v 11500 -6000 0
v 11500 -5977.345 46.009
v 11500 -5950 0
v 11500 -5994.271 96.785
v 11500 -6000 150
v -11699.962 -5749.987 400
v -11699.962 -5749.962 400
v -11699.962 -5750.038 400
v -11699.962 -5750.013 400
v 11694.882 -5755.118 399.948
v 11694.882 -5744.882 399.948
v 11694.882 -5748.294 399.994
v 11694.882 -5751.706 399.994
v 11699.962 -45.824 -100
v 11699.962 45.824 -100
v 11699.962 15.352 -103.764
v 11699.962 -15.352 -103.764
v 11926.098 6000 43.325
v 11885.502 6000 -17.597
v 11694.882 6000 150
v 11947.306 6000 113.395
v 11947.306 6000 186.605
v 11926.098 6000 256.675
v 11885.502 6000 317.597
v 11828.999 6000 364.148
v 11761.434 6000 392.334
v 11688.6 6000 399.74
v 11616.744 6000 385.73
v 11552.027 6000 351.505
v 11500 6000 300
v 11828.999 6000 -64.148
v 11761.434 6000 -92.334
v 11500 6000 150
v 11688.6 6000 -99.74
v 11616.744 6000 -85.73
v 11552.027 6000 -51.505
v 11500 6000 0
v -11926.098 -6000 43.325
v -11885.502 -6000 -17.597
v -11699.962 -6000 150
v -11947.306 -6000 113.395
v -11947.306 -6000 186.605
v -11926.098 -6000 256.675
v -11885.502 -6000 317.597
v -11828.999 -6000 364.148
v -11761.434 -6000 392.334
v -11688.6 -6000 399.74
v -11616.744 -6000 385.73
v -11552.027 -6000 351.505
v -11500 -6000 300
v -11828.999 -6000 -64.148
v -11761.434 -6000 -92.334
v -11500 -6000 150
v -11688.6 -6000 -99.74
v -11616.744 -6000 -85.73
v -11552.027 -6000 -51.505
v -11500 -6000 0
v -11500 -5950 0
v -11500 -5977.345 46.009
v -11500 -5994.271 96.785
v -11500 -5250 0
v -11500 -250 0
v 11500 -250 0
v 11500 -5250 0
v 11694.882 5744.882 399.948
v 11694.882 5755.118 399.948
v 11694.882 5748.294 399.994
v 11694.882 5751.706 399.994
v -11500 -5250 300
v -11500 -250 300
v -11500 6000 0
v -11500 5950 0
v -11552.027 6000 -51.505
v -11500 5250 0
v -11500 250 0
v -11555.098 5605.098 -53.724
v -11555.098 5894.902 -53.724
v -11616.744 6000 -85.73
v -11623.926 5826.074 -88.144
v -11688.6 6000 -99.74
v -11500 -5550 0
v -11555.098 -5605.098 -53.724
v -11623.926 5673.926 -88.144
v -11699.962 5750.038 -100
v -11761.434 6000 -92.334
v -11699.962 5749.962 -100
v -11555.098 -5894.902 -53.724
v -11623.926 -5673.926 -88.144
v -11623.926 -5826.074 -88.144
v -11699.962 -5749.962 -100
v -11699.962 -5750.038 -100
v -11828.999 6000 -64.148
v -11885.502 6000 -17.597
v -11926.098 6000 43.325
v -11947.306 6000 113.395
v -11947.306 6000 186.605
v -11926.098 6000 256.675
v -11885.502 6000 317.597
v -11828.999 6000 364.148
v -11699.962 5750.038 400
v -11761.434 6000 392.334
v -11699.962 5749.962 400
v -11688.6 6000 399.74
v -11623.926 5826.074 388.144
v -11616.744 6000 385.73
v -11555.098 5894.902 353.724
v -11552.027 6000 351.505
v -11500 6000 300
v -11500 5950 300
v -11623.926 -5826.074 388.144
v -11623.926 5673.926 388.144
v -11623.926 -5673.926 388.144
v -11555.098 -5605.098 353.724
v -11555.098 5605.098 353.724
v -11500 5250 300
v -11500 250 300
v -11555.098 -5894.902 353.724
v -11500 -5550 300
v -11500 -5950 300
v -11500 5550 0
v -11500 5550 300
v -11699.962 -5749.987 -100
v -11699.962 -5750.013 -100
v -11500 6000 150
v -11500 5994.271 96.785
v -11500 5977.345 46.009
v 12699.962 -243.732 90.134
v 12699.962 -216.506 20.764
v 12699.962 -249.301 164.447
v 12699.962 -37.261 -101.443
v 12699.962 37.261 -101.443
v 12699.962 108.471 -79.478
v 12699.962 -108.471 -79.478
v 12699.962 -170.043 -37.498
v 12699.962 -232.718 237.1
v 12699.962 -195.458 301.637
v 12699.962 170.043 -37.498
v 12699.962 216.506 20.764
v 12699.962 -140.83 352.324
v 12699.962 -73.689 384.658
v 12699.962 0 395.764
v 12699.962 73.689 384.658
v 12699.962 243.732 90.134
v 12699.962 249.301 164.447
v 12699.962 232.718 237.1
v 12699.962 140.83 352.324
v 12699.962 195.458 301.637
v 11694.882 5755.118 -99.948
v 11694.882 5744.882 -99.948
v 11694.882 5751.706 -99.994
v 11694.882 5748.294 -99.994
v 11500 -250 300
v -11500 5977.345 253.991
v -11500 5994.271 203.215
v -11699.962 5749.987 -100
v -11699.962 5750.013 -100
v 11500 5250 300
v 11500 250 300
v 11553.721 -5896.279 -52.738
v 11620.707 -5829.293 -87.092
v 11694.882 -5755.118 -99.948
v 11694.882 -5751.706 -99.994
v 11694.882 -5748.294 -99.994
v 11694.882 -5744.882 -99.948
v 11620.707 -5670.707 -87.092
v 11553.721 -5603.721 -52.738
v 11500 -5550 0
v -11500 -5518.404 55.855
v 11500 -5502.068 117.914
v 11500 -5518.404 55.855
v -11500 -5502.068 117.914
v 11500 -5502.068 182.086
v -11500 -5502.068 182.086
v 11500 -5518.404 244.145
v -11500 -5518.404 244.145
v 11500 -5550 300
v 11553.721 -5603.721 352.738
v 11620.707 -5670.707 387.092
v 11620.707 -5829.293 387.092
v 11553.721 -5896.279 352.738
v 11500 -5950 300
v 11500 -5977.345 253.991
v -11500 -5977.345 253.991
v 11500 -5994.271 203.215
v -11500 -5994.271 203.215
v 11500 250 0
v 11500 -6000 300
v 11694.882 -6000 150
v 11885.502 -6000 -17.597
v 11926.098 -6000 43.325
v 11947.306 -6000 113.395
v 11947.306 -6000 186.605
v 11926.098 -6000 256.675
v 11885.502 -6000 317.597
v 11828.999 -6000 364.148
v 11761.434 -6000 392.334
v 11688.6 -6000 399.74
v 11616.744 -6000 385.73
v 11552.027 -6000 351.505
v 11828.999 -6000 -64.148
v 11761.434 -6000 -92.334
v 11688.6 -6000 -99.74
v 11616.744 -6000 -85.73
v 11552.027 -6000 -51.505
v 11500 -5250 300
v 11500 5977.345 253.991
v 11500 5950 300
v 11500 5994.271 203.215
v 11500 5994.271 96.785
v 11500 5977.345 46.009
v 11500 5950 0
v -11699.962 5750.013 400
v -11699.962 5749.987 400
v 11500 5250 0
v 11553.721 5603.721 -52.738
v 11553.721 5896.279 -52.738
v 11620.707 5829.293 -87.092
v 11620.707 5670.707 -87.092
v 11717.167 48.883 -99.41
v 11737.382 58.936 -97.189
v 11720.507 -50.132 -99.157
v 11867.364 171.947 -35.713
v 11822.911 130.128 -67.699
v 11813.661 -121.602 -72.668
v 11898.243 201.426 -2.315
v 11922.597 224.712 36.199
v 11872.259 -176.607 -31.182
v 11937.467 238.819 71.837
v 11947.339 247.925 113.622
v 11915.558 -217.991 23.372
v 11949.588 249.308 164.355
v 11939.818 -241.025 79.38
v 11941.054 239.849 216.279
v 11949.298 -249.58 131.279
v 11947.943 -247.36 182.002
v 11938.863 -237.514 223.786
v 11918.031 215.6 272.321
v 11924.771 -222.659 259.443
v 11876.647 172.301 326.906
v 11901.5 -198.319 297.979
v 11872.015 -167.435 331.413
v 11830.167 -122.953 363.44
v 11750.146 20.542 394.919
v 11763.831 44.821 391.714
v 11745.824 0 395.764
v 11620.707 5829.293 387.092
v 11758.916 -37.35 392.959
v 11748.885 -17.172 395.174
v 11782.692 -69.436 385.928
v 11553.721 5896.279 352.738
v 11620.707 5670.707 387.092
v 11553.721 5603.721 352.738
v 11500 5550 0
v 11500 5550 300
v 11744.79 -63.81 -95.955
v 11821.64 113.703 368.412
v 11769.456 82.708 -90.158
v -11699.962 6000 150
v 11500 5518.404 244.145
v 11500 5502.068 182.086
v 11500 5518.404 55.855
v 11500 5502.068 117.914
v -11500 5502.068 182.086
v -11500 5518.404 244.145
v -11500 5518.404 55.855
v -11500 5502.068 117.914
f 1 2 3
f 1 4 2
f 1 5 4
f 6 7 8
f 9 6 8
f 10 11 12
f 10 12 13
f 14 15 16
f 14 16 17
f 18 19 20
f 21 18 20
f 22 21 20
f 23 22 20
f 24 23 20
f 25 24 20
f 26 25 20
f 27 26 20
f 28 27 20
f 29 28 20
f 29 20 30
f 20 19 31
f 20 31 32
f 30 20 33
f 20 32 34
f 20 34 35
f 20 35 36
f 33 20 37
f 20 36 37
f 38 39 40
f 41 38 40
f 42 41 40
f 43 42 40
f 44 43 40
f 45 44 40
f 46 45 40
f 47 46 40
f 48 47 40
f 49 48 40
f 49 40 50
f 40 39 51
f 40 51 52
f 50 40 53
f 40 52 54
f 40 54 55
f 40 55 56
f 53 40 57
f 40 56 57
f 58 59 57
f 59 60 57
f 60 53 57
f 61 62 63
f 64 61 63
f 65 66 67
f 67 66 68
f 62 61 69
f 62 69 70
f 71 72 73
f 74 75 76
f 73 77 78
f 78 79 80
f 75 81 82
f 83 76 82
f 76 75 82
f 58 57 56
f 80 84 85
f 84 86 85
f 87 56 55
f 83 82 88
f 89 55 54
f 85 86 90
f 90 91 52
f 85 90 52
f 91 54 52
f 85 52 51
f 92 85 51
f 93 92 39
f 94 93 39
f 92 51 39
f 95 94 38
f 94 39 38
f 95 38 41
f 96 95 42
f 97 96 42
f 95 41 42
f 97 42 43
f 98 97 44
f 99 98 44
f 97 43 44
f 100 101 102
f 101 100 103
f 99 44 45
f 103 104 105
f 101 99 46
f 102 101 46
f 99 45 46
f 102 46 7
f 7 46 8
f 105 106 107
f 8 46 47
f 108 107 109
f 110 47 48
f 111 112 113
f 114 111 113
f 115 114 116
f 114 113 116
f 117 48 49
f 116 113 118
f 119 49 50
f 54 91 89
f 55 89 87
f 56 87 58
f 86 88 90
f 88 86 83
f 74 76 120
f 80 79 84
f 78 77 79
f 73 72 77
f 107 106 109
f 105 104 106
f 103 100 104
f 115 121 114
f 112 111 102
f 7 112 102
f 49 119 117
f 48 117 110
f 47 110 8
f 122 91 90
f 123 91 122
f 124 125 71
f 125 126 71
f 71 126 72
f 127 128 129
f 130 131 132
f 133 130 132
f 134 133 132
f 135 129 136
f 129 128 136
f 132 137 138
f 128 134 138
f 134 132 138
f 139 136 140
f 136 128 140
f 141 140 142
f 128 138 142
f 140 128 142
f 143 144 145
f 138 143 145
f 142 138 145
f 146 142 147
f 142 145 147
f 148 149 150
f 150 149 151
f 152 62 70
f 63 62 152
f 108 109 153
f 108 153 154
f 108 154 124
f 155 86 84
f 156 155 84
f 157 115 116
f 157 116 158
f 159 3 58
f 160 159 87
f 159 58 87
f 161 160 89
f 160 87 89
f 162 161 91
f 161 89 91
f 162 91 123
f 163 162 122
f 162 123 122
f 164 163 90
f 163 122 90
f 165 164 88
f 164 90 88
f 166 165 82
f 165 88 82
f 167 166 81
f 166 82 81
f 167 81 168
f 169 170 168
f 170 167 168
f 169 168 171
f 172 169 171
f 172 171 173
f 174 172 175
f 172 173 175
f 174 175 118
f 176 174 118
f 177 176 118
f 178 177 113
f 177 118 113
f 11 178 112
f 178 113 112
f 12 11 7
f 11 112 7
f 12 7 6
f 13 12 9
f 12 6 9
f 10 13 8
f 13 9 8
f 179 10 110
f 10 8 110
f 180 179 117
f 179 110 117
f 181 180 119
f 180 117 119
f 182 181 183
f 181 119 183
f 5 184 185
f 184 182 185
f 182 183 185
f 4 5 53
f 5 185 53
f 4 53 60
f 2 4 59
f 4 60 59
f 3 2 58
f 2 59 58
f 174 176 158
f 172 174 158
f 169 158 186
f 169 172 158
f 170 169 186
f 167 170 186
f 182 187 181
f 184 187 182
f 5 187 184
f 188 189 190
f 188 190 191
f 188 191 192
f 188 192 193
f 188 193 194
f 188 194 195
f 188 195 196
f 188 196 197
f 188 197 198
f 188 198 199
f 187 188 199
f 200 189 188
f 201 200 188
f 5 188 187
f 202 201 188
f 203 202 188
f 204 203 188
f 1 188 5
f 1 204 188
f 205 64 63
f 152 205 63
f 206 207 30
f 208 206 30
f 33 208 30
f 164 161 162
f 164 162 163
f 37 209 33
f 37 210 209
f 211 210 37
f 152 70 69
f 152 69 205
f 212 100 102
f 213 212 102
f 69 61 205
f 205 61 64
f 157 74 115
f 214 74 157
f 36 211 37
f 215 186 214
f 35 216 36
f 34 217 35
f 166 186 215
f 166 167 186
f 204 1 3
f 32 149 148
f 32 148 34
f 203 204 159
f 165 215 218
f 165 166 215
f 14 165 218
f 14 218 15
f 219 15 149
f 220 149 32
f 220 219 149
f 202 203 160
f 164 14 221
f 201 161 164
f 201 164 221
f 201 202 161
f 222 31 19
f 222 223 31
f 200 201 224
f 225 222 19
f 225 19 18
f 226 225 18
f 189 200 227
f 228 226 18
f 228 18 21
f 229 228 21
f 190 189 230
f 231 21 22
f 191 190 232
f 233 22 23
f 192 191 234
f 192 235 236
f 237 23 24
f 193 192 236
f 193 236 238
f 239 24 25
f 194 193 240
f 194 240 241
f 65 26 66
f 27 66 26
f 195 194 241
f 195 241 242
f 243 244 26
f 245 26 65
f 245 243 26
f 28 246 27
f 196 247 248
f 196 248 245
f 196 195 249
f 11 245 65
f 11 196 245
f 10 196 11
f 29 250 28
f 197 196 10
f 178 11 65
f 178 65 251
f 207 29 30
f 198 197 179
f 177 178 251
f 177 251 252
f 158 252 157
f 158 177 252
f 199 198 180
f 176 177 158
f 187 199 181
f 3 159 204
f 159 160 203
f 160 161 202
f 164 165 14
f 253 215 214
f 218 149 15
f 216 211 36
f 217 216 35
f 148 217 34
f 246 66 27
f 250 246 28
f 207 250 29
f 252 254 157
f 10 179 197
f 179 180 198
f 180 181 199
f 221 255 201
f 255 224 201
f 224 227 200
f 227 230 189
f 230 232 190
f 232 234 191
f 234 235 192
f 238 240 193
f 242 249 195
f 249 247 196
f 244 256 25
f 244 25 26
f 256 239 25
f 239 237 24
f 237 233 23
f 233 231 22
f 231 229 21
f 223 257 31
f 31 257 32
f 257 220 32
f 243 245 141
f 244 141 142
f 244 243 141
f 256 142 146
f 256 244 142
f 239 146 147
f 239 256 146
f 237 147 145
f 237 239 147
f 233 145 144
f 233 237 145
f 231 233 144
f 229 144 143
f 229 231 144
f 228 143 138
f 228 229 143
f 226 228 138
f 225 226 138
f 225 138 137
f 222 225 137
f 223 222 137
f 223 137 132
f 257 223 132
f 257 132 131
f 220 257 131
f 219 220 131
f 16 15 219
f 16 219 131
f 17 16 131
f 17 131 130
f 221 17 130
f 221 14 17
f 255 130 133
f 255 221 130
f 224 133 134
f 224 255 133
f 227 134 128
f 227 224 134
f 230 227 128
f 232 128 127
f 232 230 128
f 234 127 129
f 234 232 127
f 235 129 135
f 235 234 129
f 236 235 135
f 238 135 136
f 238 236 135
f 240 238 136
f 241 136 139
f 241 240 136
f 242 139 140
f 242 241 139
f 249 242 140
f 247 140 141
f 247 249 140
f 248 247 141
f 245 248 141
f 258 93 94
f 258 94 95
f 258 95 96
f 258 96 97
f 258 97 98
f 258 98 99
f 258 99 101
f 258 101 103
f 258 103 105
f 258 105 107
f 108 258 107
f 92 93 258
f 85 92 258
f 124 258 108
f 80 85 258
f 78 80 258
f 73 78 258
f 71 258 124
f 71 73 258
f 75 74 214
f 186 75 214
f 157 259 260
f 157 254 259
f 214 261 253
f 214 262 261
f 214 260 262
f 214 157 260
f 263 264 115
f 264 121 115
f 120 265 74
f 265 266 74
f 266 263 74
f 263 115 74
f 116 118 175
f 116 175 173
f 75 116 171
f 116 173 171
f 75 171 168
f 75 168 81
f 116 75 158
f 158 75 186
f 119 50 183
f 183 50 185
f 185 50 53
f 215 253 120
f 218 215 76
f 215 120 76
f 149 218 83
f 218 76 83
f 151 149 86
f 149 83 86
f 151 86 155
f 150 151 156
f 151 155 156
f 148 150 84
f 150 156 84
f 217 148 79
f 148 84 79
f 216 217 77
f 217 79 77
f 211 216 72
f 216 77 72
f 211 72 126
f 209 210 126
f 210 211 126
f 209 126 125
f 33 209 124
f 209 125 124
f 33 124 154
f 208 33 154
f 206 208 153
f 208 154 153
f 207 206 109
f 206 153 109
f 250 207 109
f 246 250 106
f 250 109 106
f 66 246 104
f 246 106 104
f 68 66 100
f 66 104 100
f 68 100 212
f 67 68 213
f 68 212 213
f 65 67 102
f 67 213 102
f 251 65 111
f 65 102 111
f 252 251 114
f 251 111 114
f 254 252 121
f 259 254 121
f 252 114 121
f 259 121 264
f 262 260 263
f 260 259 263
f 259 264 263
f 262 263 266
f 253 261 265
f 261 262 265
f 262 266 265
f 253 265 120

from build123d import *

# Parameters (mm, degrees)
SKETCH1_W                = 23000
SKETCH1_H                = 5000
BOSS_EXTRUDE1_DEPTH      = 300
BOSS_EXTRUDE1_2_DEPTH    = 300
BOSS_EXTRUDE2_DEPTH      = 6000
BOSS_EXTRUDE2_DEPTH_BACK = 6000
BOSS_EXTRUDE3_DEPTH      = 23194.882000034
BOSS_EXTRUDE3_DEPTH_BACK = 199.962000126
SKETCH4_R                = 250
BOSS_EXTRUDE4_START      = -199.962000126
SKETCH5_R                = 250
BOSS_EXTRUDE4_DEPTH      = 1000


with BuildPart() as part:
    # Sketch1 → Boss-Extrude1 (new body)
    with BuildSketch(Plane.XY):
        with Locations((0, 2750)):
            Rectangle(SKETCH1_W, SKETCH1_H)
    extrude(amount=BOSS_EXTRUDE1_DEPTH)

    # Sketch2 → Boss-Extrude2 (add, two sides: drawn at the far end of the back side and taken through both)
    with BuildSketch(Plane(origin=(0, 0, 0), x_dir=(1, 0, 0), z_dir=(0, 1, 0)).offset(-BOSS_EXTRUDE2_DEPTH_BACK)):
        with BuildLine():
            ThreePointArc((11500, 0), (11950, -150), (11500, -300))
            Line((11500, -300), (11500, 0))
        make_face()
        with BuildLine():
            ThreePointArc((-11500, 0), (-11950, -150), (-11500, -300))
            Line((-11500, -300), (-11500, 0))
        make_face()
    extrude(amount=BOSS_EXTRUDE2_DEPTH + BOSS_EXTRUDE2_DEPTH_BACK)

    # Sketch4 → Boss-Extrude3 (add, two sides: drawn at the far end of the back side and taken through both)
    with BuildSketch(Plane(origin=(-11500, 0, 0), x_dir=(0, 0, -1), z_dir=(1, 0, 0)).offset(-BOSS_EXTRUDE3_DEPTH_BACK)):
        with Locations(Location((-150, 5750, 0), (0, 0, 306.869897646))):
            Circle(SKETCH4_R)
        with Locations(Location((-150, -5750, 0), (0, 0, 306.869897646))):
            Circle(SKETCH4_R)
    extrude(amount=BOSS_EXTRUDE3_DEPTH + BOSS_EXTRUDE3_DEPTH_BACK)

    # Sketch5 → Boss-Extrude4 (add)
    with BuildSketch(Plane.ZY.offset(-11500).offset(BOSS_EXTRUDE4_START)):
        with Locations((145.764474573, 0)):
            Circle(SKETCH5_R)
    extrude(amount=-BOSS_EXTRUDE4_DEPTH)


with BuildPart() as body_2:
    # Sketch1 → Boss-Extrude1 2 (new body)
    with BuildSketch(Plane.XY):
        with Locations((0, -2750)):
            Rectangle(SKETCH1_W, SKETCH1_H)
    extrude(amount=BOSS_EXTRUDE1_2_DEPTH)


solid = Compound([part.part, body_2.part])
